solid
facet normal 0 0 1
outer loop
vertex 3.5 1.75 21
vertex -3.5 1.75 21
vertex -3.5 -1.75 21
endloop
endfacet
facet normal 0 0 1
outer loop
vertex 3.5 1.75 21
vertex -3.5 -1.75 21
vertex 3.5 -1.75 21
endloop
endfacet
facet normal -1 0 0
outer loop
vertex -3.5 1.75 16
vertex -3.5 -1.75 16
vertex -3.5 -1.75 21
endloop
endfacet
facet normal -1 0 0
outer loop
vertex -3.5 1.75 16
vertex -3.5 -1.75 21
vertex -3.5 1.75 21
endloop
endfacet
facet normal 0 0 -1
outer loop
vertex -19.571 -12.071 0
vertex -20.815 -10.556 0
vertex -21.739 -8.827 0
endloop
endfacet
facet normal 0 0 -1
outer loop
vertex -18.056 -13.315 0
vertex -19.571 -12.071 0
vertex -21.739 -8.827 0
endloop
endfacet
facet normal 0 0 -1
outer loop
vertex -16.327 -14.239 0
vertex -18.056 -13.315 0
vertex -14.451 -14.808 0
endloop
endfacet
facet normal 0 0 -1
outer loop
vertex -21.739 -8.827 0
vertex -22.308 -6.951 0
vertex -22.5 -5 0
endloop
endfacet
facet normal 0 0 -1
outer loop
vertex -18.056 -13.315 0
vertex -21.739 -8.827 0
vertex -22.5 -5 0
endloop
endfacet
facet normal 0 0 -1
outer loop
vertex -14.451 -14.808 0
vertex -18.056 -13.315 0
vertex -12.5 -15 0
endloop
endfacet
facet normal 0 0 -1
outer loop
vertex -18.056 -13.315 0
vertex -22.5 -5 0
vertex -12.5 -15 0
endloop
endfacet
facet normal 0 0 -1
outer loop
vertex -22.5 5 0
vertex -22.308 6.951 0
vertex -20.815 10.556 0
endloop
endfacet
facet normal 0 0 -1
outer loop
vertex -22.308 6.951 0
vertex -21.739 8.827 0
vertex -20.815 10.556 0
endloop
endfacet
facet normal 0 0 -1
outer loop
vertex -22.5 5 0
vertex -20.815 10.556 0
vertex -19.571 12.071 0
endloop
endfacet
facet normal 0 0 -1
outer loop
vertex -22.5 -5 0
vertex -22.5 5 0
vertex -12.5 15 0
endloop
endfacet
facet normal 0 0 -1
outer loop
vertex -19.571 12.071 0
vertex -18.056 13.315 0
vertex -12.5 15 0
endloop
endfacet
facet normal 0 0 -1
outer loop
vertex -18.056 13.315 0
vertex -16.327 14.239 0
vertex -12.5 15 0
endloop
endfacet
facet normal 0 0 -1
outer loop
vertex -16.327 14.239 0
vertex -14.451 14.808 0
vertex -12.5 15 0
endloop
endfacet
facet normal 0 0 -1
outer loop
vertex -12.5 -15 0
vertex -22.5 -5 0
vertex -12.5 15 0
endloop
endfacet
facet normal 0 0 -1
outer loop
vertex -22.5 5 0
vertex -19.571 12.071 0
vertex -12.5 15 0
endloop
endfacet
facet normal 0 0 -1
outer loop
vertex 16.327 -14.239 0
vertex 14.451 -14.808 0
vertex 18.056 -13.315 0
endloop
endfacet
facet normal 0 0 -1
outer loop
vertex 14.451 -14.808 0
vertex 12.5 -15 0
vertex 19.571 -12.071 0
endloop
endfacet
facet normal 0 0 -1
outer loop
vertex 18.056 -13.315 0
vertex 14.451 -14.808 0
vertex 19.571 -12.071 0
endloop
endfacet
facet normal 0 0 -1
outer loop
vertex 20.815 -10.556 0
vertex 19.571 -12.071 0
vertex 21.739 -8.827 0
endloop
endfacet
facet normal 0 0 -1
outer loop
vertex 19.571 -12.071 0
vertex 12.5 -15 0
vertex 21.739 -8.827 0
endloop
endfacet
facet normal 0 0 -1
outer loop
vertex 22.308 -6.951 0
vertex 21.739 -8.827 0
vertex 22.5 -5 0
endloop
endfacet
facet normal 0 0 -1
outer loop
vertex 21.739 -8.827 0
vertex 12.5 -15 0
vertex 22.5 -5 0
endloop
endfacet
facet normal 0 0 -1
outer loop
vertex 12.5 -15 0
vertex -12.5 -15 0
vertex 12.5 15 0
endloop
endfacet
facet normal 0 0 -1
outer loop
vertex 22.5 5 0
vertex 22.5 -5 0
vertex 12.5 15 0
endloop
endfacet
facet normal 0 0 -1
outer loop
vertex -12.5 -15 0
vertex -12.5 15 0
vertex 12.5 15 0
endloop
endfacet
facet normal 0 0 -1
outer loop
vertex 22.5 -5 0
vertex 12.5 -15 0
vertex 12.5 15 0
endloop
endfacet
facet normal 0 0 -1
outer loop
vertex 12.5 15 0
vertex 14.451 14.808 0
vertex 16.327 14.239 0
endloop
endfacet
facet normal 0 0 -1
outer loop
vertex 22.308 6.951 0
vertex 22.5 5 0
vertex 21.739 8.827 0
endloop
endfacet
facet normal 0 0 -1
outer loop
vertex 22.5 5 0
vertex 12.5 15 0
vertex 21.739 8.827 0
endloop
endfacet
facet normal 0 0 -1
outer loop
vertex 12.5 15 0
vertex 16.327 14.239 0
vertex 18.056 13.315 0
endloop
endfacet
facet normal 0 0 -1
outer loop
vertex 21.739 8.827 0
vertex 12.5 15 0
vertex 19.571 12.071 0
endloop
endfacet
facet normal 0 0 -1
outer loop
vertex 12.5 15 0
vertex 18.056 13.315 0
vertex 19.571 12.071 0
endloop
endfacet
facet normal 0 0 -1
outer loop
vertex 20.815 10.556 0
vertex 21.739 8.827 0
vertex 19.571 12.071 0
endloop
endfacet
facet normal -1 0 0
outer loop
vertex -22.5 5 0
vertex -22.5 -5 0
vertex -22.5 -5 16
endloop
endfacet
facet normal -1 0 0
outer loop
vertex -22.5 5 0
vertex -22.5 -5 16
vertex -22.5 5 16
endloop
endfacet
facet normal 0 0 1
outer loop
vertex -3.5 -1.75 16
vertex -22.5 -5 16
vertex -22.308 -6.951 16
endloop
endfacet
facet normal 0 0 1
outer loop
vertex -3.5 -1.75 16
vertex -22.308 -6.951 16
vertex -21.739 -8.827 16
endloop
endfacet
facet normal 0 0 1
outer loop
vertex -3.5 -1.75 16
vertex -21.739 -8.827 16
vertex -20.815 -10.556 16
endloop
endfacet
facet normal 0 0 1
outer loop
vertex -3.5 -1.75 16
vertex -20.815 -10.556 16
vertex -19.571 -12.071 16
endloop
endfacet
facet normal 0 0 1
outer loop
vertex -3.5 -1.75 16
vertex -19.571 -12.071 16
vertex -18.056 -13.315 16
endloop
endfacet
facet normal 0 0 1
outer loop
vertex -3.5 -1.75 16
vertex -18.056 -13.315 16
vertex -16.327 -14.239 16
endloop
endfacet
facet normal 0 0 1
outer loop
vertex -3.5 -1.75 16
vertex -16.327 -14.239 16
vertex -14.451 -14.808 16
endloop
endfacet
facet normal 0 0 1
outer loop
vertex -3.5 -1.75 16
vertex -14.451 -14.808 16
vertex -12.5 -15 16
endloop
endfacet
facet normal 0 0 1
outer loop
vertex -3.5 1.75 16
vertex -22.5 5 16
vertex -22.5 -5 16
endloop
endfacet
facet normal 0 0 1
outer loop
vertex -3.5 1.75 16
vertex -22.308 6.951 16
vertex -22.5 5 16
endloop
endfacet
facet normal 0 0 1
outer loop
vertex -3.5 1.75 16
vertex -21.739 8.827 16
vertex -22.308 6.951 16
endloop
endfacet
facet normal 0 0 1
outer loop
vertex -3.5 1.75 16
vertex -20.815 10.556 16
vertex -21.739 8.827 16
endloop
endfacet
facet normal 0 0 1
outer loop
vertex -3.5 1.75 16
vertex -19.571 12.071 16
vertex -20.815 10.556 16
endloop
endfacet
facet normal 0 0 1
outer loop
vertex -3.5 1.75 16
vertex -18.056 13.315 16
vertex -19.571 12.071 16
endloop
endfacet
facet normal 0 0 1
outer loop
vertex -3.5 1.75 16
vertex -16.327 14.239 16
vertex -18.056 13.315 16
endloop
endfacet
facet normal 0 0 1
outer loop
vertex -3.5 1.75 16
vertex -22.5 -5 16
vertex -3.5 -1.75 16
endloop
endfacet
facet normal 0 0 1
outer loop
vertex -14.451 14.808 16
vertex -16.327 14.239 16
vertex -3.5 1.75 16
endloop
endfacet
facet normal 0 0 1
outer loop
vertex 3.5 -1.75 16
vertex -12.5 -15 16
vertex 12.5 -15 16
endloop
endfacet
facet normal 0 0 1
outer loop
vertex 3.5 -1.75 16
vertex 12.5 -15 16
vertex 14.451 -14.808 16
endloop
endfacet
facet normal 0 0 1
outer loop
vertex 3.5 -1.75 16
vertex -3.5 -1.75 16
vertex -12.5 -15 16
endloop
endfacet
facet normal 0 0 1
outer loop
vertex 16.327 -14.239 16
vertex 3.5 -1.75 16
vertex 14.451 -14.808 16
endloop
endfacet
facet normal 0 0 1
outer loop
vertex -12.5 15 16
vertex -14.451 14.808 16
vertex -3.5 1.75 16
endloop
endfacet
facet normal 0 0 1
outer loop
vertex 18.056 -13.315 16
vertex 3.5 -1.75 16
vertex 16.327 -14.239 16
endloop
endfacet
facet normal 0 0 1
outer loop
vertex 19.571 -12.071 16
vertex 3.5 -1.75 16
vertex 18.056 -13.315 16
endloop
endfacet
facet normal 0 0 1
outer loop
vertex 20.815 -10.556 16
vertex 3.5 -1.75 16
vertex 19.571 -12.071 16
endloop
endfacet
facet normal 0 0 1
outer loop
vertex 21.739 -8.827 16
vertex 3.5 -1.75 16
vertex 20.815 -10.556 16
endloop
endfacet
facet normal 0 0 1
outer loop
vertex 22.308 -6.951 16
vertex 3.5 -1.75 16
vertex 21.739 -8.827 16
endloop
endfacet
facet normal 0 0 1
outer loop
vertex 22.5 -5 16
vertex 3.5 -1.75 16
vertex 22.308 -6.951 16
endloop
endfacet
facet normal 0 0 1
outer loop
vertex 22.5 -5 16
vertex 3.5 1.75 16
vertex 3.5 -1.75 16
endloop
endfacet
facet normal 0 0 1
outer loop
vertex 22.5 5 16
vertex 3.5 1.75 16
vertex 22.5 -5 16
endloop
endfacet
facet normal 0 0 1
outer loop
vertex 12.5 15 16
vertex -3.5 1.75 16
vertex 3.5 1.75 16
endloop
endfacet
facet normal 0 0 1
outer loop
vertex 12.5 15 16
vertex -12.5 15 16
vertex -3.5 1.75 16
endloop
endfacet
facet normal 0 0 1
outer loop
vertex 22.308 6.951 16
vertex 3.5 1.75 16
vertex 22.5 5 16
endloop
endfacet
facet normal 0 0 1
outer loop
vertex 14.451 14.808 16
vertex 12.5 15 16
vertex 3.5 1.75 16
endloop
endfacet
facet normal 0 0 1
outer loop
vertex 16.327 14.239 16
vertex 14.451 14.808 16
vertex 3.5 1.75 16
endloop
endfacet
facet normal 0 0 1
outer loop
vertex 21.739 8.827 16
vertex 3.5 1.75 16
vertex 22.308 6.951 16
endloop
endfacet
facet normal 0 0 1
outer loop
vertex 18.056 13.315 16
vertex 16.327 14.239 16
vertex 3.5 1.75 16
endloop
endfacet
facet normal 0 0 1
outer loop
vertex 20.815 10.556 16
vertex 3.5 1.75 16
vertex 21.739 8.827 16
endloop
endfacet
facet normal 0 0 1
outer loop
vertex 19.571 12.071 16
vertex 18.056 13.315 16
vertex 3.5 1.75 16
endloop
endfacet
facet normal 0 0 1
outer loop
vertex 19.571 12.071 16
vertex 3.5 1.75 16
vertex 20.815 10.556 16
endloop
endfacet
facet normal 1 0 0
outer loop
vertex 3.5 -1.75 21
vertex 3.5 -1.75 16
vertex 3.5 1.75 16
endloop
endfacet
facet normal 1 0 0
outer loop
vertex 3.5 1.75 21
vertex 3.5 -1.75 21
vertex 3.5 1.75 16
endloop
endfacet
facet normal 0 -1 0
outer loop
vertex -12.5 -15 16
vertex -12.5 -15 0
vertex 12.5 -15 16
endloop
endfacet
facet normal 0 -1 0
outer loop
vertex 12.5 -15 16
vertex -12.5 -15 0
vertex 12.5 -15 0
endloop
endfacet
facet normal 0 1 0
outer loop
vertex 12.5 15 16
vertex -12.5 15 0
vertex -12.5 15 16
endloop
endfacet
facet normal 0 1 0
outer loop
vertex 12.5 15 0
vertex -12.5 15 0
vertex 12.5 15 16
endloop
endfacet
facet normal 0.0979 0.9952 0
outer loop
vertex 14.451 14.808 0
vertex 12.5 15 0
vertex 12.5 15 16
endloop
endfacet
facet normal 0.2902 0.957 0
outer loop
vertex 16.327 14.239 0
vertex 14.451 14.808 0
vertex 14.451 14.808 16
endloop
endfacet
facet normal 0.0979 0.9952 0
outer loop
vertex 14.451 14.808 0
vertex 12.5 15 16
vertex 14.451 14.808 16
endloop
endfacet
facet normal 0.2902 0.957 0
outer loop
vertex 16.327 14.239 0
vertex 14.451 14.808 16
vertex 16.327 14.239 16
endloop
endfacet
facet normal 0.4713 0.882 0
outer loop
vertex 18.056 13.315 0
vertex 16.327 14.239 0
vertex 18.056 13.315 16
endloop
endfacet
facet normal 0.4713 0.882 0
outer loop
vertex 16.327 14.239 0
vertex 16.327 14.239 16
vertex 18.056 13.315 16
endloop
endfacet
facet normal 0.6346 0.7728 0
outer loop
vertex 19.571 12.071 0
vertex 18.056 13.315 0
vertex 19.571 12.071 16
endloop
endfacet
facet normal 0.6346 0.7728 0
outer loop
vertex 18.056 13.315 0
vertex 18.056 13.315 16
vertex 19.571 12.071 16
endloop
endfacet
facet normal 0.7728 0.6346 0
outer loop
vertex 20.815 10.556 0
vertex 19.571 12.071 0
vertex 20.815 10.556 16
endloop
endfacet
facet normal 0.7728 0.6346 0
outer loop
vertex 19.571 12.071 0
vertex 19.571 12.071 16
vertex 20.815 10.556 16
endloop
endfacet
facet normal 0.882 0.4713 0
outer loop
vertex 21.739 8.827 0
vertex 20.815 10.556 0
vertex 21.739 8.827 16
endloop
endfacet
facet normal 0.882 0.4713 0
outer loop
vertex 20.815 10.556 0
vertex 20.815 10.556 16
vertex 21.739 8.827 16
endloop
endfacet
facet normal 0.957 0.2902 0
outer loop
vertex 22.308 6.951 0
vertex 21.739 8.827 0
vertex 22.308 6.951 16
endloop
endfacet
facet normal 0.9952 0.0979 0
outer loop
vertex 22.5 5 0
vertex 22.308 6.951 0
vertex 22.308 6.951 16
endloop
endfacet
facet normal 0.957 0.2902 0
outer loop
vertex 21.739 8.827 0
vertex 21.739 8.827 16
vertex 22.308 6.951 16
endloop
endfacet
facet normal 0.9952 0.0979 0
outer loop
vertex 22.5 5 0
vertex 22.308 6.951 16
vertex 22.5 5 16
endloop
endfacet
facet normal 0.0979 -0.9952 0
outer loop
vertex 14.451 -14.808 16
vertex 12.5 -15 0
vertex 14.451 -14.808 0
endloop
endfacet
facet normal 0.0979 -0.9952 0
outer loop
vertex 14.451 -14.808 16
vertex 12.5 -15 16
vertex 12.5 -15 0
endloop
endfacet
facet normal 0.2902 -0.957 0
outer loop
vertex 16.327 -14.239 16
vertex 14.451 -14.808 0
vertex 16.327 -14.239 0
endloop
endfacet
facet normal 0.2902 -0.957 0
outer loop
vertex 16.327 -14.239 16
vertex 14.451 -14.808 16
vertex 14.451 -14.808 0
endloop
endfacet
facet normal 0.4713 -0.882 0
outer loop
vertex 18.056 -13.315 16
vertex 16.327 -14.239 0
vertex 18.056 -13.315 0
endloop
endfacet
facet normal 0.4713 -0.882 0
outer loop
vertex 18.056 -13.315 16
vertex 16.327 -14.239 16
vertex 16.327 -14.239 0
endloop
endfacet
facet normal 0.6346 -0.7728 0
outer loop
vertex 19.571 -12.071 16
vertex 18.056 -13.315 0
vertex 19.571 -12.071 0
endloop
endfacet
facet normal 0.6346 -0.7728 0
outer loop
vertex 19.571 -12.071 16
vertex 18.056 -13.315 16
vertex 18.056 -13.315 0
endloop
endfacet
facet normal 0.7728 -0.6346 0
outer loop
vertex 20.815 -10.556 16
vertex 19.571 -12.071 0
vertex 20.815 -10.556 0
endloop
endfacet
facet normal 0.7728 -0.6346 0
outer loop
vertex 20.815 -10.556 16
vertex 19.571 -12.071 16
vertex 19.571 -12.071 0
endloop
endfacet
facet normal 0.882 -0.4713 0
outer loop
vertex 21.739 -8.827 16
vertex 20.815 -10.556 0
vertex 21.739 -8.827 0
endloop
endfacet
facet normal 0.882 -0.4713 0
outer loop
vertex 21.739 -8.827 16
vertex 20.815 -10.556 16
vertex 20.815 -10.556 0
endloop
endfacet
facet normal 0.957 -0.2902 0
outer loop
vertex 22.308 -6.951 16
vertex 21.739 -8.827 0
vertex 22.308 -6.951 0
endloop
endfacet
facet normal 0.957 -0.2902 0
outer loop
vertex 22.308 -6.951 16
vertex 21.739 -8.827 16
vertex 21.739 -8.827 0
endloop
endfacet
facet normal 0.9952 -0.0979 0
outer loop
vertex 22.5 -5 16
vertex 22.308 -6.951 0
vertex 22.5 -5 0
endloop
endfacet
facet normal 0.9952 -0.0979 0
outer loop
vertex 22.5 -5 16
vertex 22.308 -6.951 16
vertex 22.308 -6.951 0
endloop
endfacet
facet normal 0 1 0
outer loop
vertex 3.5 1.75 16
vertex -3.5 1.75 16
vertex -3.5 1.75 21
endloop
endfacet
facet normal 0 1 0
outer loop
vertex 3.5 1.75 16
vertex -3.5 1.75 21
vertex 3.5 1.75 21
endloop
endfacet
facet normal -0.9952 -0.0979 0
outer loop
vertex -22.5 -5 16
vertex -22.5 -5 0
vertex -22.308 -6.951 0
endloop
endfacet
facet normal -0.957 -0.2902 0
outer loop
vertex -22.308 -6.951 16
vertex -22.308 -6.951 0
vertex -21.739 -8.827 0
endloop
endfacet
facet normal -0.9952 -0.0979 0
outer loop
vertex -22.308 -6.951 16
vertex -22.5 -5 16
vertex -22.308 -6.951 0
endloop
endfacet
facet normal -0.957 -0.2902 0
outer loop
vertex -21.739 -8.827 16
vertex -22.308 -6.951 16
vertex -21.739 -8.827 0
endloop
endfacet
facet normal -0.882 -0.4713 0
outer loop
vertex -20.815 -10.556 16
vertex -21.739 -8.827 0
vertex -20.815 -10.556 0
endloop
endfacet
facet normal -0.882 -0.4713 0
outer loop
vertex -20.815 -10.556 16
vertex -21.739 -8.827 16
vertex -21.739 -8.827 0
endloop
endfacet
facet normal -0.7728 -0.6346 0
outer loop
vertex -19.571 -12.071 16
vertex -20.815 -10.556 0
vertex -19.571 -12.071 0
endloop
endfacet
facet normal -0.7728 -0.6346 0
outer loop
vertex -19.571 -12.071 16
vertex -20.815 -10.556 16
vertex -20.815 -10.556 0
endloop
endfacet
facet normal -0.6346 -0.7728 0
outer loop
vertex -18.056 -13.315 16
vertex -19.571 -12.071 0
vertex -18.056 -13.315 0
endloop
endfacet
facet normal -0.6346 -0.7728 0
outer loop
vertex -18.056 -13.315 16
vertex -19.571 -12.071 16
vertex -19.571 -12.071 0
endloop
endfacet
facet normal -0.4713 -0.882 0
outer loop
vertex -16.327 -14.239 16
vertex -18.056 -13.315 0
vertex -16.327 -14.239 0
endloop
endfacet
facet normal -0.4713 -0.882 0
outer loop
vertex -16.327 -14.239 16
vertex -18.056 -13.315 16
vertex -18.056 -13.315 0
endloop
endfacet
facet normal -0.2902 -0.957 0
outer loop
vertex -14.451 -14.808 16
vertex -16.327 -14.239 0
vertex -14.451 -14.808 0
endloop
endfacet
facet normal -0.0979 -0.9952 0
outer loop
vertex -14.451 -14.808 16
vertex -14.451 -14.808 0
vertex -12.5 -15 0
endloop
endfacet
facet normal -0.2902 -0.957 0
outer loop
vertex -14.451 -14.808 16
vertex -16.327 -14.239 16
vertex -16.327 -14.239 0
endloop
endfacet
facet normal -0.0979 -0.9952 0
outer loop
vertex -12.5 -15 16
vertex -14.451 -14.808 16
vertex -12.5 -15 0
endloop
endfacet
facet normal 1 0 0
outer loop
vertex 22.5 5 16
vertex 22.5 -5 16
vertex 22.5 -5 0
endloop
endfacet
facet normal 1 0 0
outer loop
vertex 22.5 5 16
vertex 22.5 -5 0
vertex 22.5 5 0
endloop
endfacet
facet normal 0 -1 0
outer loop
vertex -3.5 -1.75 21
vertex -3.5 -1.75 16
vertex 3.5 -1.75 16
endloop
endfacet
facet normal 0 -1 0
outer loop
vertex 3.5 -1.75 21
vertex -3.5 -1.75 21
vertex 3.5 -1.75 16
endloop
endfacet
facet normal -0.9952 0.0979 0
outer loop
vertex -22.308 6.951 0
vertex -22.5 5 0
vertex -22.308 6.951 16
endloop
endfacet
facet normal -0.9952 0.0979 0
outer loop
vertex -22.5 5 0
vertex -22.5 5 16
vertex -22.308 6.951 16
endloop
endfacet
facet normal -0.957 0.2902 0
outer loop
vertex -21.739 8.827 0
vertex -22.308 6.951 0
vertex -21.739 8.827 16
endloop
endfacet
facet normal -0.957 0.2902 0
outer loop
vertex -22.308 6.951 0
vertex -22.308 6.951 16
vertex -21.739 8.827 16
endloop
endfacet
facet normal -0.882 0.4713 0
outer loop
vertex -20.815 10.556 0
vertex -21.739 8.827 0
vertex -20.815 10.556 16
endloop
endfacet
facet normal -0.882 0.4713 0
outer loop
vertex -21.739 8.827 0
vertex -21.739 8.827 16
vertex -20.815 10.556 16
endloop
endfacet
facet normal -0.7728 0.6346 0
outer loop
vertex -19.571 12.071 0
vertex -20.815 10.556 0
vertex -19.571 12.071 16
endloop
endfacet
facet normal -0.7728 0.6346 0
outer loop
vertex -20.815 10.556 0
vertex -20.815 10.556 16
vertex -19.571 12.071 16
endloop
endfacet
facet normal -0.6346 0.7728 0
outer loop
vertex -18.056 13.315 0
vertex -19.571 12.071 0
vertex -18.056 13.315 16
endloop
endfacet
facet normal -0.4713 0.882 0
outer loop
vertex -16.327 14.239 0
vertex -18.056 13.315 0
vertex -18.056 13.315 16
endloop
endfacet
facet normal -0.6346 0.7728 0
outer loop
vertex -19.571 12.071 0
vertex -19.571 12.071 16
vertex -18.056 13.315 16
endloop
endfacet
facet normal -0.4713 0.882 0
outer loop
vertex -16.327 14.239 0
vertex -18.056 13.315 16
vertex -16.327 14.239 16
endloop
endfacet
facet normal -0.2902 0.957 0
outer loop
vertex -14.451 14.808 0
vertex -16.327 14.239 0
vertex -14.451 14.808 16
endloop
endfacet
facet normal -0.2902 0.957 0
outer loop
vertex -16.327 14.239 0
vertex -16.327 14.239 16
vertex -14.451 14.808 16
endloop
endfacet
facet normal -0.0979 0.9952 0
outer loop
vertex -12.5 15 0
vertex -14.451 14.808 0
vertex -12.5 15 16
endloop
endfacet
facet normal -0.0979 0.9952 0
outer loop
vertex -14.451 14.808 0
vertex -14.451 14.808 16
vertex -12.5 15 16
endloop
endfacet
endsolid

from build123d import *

# Parameters (mm, degrees)
SKETCH1_W           = 45
SKETCH1_H           = 30
BOSS_EXTRUDE1_DEPTH = 16
SKETCH2_W           = 7
SKETCH2_H           = 3.5
BOSS_EXTRUDE2_DEPTH = 5
FILLET1_R           = 10


with BuildPart() as part:
    # Sketch1 → Boss-Extrude1 (new body)
    with BuildSketch(Plane.XY):
        Rectangle(SKETCH1_W, SKETCH1_H)
    extrude(amount=BOSS_EXTRUDE1_DEPTH)

    # Sketch2 → Boss-Extrude2 (add)
    with BuildSketch(Plane.XY.offset(16)):
        Rectangle(SKETCH2_W, SKETCH2_H)
    extrude(amount=BOSS_EXTRUDE2_DEPTH)

    # Fillet1
    fillet1_edges = [part.edges().sort_by_distance(p)[0] for p in [
        (22.5, -15, 8),
        (-22.5, -15, 8),
        (-22.5, 15, 8),
        (22.5, 15, 8),
    ]]
    fillet(fillet1_edges, radius=FILLET1_R)


solid = part.part
